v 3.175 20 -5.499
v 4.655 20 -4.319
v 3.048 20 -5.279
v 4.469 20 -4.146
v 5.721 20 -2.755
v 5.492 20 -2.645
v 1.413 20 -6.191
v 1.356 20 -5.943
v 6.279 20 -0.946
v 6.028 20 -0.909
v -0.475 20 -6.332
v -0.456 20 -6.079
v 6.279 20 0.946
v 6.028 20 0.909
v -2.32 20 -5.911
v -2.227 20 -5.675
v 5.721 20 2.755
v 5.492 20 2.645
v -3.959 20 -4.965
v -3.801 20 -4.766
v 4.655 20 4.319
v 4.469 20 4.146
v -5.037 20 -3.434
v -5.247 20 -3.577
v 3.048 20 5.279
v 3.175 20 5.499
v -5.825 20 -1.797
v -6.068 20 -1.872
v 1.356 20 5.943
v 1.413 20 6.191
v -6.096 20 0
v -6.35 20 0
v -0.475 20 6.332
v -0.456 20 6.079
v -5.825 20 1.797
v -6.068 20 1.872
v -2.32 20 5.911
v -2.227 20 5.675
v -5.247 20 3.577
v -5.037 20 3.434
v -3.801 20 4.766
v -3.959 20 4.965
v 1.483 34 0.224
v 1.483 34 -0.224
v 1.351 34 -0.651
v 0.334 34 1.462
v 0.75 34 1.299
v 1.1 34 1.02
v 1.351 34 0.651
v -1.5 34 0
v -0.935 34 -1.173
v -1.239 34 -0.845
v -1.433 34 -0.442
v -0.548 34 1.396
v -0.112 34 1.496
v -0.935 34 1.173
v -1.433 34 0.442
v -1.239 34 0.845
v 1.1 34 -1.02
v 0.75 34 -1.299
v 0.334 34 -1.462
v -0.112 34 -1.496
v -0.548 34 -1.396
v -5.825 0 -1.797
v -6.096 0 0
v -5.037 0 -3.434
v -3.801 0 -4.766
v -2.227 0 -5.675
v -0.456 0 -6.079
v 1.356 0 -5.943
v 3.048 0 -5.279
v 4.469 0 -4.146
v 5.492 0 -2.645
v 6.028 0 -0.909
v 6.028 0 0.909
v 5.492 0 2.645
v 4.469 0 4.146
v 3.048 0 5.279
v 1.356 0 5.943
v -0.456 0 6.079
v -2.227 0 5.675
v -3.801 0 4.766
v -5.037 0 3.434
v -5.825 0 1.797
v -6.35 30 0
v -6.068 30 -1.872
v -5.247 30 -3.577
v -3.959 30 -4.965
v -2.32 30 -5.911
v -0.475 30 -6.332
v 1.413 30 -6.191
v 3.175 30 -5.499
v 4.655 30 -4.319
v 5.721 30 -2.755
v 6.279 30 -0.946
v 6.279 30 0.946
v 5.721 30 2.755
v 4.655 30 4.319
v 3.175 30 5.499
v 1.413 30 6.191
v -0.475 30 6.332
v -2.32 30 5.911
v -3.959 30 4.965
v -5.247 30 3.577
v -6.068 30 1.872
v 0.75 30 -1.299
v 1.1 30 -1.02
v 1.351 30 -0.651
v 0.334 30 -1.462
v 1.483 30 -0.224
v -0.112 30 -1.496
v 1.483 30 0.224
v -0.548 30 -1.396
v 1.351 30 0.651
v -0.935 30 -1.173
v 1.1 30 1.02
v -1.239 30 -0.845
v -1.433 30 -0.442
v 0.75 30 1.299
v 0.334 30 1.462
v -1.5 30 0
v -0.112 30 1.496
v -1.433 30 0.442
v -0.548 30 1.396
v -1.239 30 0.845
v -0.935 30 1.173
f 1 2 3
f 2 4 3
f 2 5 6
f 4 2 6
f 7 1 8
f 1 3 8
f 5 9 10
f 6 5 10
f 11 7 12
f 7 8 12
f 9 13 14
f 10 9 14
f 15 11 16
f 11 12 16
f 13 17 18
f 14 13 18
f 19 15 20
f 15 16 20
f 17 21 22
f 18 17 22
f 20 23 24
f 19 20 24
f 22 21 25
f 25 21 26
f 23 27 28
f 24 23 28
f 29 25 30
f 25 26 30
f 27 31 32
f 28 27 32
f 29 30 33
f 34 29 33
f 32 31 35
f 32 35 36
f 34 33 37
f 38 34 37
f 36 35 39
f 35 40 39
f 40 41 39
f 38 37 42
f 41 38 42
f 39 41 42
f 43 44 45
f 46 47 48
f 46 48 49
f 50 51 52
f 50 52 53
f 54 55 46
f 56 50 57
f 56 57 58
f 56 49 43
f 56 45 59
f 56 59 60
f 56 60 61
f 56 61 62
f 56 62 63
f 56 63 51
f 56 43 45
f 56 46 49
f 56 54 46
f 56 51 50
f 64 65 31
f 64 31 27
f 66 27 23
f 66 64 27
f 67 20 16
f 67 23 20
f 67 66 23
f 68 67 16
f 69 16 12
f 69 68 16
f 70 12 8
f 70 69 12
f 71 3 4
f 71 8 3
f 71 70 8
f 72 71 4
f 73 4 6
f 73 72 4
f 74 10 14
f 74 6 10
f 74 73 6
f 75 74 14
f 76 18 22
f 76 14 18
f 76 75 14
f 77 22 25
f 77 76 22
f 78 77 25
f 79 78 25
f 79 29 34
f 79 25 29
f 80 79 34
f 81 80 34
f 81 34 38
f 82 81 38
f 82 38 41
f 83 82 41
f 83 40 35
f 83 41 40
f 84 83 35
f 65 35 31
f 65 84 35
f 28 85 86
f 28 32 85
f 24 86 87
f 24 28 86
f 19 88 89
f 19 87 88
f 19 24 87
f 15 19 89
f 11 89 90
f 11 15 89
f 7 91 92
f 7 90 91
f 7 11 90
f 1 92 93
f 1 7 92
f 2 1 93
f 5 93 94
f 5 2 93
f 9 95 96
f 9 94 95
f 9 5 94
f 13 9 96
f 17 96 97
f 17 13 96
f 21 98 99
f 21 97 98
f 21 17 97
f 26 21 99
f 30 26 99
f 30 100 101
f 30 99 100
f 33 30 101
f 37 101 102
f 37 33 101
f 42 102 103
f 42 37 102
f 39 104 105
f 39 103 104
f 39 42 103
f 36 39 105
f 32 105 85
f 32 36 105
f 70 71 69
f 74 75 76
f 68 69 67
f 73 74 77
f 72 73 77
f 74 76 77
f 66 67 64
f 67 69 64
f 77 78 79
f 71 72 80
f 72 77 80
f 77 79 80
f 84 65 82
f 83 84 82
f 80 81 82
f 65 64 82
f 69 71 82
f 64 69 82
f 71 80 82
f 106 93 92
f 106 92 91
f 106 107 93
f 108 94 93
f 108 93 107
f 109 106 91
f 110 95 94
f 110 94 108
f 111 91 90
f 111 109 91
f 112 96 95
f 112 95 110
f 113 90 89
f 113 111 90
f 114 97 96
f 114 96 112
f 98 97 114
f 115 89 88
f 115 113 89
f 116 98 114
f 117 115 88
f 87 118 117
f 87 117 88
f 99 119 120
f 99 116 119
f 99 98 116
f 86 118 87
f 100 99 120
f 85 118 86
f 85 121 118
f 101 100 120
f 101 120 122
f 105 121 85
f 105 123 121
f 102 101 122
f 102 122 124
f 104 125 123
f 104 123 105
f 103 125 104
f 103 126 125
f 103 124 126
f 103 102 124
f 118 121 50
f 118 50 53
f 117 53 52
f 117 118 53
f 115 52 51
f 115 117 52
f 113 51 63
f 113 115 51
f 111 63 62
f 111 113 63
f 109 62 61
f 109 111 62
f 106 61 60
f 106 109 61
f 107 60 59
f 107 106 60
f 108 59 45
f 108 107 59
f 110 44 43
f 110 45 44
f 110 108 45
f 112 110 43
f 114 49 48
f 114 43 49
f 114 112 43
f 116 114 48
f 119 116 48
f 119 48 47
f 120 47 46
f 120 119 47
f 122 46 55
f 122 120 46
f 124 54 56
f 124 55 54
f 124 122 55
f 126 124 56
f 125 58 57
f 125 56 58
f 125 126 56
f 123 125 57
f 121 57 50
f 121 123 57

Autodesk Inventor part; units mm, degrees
ref_plane "YZ Plane" through (0, 0, 0) normal (1, 0, 0) x (0, 1, 0)
ref_plane "XZ Plane" through (0, 0, 0) normal (0, 1, 0) x (-1, 0, 0)
ref_plane "XY Plane" through (0, 0, 0) normal (0, 0, 1) x (1, 0, 0)
sketch "Sketch1" plane through (0, 0, 0) normal (0, 0, 1) x (1, 0, 0)
  line L0 (0, 34) -> (-1.5, 34)
  line L1 (-1.5, 34) -> (-1.5, 30)
  line L2 (-1.5, 30) -> (-6.35, 30)
  line L3 (-6.35, 30) -> (-6.35, 20)
  line L4 (-6.35, 20) -> (-6.096, 20)
  line L5 (-6.096, 20) -> (-6.096, 0)
  line L6 (-6.096, 0) -> (0, 0)
  line L7 (0, 0) -> (0, 34)
  dimension "d0" = 1.5
  dimension "d2" = 6.096
  dimension "d3" = 20
  dimension "d4" = 4
  dimension "d5" = 10
  dimension "d9" = 6.35
revolve "Revolution1" add sketch "Sketch1" angle 360 about axis through (0, 0, 0) along (0, 1, 0)
thread "Thread1" size "M3x0.5" class "6g" standard "ANSI Metric M Profile" full length
equation "\"d2\" = 0.5 * tube_od - tube_wall"
equation "\"d9\" = 0.5 * tube_od"
equation "\"tube_od\" = 12.7"
equation "\"tube_wall\" = 0.254"
properties part number "tubeFitting" material "Brass, Soft Yellow"
